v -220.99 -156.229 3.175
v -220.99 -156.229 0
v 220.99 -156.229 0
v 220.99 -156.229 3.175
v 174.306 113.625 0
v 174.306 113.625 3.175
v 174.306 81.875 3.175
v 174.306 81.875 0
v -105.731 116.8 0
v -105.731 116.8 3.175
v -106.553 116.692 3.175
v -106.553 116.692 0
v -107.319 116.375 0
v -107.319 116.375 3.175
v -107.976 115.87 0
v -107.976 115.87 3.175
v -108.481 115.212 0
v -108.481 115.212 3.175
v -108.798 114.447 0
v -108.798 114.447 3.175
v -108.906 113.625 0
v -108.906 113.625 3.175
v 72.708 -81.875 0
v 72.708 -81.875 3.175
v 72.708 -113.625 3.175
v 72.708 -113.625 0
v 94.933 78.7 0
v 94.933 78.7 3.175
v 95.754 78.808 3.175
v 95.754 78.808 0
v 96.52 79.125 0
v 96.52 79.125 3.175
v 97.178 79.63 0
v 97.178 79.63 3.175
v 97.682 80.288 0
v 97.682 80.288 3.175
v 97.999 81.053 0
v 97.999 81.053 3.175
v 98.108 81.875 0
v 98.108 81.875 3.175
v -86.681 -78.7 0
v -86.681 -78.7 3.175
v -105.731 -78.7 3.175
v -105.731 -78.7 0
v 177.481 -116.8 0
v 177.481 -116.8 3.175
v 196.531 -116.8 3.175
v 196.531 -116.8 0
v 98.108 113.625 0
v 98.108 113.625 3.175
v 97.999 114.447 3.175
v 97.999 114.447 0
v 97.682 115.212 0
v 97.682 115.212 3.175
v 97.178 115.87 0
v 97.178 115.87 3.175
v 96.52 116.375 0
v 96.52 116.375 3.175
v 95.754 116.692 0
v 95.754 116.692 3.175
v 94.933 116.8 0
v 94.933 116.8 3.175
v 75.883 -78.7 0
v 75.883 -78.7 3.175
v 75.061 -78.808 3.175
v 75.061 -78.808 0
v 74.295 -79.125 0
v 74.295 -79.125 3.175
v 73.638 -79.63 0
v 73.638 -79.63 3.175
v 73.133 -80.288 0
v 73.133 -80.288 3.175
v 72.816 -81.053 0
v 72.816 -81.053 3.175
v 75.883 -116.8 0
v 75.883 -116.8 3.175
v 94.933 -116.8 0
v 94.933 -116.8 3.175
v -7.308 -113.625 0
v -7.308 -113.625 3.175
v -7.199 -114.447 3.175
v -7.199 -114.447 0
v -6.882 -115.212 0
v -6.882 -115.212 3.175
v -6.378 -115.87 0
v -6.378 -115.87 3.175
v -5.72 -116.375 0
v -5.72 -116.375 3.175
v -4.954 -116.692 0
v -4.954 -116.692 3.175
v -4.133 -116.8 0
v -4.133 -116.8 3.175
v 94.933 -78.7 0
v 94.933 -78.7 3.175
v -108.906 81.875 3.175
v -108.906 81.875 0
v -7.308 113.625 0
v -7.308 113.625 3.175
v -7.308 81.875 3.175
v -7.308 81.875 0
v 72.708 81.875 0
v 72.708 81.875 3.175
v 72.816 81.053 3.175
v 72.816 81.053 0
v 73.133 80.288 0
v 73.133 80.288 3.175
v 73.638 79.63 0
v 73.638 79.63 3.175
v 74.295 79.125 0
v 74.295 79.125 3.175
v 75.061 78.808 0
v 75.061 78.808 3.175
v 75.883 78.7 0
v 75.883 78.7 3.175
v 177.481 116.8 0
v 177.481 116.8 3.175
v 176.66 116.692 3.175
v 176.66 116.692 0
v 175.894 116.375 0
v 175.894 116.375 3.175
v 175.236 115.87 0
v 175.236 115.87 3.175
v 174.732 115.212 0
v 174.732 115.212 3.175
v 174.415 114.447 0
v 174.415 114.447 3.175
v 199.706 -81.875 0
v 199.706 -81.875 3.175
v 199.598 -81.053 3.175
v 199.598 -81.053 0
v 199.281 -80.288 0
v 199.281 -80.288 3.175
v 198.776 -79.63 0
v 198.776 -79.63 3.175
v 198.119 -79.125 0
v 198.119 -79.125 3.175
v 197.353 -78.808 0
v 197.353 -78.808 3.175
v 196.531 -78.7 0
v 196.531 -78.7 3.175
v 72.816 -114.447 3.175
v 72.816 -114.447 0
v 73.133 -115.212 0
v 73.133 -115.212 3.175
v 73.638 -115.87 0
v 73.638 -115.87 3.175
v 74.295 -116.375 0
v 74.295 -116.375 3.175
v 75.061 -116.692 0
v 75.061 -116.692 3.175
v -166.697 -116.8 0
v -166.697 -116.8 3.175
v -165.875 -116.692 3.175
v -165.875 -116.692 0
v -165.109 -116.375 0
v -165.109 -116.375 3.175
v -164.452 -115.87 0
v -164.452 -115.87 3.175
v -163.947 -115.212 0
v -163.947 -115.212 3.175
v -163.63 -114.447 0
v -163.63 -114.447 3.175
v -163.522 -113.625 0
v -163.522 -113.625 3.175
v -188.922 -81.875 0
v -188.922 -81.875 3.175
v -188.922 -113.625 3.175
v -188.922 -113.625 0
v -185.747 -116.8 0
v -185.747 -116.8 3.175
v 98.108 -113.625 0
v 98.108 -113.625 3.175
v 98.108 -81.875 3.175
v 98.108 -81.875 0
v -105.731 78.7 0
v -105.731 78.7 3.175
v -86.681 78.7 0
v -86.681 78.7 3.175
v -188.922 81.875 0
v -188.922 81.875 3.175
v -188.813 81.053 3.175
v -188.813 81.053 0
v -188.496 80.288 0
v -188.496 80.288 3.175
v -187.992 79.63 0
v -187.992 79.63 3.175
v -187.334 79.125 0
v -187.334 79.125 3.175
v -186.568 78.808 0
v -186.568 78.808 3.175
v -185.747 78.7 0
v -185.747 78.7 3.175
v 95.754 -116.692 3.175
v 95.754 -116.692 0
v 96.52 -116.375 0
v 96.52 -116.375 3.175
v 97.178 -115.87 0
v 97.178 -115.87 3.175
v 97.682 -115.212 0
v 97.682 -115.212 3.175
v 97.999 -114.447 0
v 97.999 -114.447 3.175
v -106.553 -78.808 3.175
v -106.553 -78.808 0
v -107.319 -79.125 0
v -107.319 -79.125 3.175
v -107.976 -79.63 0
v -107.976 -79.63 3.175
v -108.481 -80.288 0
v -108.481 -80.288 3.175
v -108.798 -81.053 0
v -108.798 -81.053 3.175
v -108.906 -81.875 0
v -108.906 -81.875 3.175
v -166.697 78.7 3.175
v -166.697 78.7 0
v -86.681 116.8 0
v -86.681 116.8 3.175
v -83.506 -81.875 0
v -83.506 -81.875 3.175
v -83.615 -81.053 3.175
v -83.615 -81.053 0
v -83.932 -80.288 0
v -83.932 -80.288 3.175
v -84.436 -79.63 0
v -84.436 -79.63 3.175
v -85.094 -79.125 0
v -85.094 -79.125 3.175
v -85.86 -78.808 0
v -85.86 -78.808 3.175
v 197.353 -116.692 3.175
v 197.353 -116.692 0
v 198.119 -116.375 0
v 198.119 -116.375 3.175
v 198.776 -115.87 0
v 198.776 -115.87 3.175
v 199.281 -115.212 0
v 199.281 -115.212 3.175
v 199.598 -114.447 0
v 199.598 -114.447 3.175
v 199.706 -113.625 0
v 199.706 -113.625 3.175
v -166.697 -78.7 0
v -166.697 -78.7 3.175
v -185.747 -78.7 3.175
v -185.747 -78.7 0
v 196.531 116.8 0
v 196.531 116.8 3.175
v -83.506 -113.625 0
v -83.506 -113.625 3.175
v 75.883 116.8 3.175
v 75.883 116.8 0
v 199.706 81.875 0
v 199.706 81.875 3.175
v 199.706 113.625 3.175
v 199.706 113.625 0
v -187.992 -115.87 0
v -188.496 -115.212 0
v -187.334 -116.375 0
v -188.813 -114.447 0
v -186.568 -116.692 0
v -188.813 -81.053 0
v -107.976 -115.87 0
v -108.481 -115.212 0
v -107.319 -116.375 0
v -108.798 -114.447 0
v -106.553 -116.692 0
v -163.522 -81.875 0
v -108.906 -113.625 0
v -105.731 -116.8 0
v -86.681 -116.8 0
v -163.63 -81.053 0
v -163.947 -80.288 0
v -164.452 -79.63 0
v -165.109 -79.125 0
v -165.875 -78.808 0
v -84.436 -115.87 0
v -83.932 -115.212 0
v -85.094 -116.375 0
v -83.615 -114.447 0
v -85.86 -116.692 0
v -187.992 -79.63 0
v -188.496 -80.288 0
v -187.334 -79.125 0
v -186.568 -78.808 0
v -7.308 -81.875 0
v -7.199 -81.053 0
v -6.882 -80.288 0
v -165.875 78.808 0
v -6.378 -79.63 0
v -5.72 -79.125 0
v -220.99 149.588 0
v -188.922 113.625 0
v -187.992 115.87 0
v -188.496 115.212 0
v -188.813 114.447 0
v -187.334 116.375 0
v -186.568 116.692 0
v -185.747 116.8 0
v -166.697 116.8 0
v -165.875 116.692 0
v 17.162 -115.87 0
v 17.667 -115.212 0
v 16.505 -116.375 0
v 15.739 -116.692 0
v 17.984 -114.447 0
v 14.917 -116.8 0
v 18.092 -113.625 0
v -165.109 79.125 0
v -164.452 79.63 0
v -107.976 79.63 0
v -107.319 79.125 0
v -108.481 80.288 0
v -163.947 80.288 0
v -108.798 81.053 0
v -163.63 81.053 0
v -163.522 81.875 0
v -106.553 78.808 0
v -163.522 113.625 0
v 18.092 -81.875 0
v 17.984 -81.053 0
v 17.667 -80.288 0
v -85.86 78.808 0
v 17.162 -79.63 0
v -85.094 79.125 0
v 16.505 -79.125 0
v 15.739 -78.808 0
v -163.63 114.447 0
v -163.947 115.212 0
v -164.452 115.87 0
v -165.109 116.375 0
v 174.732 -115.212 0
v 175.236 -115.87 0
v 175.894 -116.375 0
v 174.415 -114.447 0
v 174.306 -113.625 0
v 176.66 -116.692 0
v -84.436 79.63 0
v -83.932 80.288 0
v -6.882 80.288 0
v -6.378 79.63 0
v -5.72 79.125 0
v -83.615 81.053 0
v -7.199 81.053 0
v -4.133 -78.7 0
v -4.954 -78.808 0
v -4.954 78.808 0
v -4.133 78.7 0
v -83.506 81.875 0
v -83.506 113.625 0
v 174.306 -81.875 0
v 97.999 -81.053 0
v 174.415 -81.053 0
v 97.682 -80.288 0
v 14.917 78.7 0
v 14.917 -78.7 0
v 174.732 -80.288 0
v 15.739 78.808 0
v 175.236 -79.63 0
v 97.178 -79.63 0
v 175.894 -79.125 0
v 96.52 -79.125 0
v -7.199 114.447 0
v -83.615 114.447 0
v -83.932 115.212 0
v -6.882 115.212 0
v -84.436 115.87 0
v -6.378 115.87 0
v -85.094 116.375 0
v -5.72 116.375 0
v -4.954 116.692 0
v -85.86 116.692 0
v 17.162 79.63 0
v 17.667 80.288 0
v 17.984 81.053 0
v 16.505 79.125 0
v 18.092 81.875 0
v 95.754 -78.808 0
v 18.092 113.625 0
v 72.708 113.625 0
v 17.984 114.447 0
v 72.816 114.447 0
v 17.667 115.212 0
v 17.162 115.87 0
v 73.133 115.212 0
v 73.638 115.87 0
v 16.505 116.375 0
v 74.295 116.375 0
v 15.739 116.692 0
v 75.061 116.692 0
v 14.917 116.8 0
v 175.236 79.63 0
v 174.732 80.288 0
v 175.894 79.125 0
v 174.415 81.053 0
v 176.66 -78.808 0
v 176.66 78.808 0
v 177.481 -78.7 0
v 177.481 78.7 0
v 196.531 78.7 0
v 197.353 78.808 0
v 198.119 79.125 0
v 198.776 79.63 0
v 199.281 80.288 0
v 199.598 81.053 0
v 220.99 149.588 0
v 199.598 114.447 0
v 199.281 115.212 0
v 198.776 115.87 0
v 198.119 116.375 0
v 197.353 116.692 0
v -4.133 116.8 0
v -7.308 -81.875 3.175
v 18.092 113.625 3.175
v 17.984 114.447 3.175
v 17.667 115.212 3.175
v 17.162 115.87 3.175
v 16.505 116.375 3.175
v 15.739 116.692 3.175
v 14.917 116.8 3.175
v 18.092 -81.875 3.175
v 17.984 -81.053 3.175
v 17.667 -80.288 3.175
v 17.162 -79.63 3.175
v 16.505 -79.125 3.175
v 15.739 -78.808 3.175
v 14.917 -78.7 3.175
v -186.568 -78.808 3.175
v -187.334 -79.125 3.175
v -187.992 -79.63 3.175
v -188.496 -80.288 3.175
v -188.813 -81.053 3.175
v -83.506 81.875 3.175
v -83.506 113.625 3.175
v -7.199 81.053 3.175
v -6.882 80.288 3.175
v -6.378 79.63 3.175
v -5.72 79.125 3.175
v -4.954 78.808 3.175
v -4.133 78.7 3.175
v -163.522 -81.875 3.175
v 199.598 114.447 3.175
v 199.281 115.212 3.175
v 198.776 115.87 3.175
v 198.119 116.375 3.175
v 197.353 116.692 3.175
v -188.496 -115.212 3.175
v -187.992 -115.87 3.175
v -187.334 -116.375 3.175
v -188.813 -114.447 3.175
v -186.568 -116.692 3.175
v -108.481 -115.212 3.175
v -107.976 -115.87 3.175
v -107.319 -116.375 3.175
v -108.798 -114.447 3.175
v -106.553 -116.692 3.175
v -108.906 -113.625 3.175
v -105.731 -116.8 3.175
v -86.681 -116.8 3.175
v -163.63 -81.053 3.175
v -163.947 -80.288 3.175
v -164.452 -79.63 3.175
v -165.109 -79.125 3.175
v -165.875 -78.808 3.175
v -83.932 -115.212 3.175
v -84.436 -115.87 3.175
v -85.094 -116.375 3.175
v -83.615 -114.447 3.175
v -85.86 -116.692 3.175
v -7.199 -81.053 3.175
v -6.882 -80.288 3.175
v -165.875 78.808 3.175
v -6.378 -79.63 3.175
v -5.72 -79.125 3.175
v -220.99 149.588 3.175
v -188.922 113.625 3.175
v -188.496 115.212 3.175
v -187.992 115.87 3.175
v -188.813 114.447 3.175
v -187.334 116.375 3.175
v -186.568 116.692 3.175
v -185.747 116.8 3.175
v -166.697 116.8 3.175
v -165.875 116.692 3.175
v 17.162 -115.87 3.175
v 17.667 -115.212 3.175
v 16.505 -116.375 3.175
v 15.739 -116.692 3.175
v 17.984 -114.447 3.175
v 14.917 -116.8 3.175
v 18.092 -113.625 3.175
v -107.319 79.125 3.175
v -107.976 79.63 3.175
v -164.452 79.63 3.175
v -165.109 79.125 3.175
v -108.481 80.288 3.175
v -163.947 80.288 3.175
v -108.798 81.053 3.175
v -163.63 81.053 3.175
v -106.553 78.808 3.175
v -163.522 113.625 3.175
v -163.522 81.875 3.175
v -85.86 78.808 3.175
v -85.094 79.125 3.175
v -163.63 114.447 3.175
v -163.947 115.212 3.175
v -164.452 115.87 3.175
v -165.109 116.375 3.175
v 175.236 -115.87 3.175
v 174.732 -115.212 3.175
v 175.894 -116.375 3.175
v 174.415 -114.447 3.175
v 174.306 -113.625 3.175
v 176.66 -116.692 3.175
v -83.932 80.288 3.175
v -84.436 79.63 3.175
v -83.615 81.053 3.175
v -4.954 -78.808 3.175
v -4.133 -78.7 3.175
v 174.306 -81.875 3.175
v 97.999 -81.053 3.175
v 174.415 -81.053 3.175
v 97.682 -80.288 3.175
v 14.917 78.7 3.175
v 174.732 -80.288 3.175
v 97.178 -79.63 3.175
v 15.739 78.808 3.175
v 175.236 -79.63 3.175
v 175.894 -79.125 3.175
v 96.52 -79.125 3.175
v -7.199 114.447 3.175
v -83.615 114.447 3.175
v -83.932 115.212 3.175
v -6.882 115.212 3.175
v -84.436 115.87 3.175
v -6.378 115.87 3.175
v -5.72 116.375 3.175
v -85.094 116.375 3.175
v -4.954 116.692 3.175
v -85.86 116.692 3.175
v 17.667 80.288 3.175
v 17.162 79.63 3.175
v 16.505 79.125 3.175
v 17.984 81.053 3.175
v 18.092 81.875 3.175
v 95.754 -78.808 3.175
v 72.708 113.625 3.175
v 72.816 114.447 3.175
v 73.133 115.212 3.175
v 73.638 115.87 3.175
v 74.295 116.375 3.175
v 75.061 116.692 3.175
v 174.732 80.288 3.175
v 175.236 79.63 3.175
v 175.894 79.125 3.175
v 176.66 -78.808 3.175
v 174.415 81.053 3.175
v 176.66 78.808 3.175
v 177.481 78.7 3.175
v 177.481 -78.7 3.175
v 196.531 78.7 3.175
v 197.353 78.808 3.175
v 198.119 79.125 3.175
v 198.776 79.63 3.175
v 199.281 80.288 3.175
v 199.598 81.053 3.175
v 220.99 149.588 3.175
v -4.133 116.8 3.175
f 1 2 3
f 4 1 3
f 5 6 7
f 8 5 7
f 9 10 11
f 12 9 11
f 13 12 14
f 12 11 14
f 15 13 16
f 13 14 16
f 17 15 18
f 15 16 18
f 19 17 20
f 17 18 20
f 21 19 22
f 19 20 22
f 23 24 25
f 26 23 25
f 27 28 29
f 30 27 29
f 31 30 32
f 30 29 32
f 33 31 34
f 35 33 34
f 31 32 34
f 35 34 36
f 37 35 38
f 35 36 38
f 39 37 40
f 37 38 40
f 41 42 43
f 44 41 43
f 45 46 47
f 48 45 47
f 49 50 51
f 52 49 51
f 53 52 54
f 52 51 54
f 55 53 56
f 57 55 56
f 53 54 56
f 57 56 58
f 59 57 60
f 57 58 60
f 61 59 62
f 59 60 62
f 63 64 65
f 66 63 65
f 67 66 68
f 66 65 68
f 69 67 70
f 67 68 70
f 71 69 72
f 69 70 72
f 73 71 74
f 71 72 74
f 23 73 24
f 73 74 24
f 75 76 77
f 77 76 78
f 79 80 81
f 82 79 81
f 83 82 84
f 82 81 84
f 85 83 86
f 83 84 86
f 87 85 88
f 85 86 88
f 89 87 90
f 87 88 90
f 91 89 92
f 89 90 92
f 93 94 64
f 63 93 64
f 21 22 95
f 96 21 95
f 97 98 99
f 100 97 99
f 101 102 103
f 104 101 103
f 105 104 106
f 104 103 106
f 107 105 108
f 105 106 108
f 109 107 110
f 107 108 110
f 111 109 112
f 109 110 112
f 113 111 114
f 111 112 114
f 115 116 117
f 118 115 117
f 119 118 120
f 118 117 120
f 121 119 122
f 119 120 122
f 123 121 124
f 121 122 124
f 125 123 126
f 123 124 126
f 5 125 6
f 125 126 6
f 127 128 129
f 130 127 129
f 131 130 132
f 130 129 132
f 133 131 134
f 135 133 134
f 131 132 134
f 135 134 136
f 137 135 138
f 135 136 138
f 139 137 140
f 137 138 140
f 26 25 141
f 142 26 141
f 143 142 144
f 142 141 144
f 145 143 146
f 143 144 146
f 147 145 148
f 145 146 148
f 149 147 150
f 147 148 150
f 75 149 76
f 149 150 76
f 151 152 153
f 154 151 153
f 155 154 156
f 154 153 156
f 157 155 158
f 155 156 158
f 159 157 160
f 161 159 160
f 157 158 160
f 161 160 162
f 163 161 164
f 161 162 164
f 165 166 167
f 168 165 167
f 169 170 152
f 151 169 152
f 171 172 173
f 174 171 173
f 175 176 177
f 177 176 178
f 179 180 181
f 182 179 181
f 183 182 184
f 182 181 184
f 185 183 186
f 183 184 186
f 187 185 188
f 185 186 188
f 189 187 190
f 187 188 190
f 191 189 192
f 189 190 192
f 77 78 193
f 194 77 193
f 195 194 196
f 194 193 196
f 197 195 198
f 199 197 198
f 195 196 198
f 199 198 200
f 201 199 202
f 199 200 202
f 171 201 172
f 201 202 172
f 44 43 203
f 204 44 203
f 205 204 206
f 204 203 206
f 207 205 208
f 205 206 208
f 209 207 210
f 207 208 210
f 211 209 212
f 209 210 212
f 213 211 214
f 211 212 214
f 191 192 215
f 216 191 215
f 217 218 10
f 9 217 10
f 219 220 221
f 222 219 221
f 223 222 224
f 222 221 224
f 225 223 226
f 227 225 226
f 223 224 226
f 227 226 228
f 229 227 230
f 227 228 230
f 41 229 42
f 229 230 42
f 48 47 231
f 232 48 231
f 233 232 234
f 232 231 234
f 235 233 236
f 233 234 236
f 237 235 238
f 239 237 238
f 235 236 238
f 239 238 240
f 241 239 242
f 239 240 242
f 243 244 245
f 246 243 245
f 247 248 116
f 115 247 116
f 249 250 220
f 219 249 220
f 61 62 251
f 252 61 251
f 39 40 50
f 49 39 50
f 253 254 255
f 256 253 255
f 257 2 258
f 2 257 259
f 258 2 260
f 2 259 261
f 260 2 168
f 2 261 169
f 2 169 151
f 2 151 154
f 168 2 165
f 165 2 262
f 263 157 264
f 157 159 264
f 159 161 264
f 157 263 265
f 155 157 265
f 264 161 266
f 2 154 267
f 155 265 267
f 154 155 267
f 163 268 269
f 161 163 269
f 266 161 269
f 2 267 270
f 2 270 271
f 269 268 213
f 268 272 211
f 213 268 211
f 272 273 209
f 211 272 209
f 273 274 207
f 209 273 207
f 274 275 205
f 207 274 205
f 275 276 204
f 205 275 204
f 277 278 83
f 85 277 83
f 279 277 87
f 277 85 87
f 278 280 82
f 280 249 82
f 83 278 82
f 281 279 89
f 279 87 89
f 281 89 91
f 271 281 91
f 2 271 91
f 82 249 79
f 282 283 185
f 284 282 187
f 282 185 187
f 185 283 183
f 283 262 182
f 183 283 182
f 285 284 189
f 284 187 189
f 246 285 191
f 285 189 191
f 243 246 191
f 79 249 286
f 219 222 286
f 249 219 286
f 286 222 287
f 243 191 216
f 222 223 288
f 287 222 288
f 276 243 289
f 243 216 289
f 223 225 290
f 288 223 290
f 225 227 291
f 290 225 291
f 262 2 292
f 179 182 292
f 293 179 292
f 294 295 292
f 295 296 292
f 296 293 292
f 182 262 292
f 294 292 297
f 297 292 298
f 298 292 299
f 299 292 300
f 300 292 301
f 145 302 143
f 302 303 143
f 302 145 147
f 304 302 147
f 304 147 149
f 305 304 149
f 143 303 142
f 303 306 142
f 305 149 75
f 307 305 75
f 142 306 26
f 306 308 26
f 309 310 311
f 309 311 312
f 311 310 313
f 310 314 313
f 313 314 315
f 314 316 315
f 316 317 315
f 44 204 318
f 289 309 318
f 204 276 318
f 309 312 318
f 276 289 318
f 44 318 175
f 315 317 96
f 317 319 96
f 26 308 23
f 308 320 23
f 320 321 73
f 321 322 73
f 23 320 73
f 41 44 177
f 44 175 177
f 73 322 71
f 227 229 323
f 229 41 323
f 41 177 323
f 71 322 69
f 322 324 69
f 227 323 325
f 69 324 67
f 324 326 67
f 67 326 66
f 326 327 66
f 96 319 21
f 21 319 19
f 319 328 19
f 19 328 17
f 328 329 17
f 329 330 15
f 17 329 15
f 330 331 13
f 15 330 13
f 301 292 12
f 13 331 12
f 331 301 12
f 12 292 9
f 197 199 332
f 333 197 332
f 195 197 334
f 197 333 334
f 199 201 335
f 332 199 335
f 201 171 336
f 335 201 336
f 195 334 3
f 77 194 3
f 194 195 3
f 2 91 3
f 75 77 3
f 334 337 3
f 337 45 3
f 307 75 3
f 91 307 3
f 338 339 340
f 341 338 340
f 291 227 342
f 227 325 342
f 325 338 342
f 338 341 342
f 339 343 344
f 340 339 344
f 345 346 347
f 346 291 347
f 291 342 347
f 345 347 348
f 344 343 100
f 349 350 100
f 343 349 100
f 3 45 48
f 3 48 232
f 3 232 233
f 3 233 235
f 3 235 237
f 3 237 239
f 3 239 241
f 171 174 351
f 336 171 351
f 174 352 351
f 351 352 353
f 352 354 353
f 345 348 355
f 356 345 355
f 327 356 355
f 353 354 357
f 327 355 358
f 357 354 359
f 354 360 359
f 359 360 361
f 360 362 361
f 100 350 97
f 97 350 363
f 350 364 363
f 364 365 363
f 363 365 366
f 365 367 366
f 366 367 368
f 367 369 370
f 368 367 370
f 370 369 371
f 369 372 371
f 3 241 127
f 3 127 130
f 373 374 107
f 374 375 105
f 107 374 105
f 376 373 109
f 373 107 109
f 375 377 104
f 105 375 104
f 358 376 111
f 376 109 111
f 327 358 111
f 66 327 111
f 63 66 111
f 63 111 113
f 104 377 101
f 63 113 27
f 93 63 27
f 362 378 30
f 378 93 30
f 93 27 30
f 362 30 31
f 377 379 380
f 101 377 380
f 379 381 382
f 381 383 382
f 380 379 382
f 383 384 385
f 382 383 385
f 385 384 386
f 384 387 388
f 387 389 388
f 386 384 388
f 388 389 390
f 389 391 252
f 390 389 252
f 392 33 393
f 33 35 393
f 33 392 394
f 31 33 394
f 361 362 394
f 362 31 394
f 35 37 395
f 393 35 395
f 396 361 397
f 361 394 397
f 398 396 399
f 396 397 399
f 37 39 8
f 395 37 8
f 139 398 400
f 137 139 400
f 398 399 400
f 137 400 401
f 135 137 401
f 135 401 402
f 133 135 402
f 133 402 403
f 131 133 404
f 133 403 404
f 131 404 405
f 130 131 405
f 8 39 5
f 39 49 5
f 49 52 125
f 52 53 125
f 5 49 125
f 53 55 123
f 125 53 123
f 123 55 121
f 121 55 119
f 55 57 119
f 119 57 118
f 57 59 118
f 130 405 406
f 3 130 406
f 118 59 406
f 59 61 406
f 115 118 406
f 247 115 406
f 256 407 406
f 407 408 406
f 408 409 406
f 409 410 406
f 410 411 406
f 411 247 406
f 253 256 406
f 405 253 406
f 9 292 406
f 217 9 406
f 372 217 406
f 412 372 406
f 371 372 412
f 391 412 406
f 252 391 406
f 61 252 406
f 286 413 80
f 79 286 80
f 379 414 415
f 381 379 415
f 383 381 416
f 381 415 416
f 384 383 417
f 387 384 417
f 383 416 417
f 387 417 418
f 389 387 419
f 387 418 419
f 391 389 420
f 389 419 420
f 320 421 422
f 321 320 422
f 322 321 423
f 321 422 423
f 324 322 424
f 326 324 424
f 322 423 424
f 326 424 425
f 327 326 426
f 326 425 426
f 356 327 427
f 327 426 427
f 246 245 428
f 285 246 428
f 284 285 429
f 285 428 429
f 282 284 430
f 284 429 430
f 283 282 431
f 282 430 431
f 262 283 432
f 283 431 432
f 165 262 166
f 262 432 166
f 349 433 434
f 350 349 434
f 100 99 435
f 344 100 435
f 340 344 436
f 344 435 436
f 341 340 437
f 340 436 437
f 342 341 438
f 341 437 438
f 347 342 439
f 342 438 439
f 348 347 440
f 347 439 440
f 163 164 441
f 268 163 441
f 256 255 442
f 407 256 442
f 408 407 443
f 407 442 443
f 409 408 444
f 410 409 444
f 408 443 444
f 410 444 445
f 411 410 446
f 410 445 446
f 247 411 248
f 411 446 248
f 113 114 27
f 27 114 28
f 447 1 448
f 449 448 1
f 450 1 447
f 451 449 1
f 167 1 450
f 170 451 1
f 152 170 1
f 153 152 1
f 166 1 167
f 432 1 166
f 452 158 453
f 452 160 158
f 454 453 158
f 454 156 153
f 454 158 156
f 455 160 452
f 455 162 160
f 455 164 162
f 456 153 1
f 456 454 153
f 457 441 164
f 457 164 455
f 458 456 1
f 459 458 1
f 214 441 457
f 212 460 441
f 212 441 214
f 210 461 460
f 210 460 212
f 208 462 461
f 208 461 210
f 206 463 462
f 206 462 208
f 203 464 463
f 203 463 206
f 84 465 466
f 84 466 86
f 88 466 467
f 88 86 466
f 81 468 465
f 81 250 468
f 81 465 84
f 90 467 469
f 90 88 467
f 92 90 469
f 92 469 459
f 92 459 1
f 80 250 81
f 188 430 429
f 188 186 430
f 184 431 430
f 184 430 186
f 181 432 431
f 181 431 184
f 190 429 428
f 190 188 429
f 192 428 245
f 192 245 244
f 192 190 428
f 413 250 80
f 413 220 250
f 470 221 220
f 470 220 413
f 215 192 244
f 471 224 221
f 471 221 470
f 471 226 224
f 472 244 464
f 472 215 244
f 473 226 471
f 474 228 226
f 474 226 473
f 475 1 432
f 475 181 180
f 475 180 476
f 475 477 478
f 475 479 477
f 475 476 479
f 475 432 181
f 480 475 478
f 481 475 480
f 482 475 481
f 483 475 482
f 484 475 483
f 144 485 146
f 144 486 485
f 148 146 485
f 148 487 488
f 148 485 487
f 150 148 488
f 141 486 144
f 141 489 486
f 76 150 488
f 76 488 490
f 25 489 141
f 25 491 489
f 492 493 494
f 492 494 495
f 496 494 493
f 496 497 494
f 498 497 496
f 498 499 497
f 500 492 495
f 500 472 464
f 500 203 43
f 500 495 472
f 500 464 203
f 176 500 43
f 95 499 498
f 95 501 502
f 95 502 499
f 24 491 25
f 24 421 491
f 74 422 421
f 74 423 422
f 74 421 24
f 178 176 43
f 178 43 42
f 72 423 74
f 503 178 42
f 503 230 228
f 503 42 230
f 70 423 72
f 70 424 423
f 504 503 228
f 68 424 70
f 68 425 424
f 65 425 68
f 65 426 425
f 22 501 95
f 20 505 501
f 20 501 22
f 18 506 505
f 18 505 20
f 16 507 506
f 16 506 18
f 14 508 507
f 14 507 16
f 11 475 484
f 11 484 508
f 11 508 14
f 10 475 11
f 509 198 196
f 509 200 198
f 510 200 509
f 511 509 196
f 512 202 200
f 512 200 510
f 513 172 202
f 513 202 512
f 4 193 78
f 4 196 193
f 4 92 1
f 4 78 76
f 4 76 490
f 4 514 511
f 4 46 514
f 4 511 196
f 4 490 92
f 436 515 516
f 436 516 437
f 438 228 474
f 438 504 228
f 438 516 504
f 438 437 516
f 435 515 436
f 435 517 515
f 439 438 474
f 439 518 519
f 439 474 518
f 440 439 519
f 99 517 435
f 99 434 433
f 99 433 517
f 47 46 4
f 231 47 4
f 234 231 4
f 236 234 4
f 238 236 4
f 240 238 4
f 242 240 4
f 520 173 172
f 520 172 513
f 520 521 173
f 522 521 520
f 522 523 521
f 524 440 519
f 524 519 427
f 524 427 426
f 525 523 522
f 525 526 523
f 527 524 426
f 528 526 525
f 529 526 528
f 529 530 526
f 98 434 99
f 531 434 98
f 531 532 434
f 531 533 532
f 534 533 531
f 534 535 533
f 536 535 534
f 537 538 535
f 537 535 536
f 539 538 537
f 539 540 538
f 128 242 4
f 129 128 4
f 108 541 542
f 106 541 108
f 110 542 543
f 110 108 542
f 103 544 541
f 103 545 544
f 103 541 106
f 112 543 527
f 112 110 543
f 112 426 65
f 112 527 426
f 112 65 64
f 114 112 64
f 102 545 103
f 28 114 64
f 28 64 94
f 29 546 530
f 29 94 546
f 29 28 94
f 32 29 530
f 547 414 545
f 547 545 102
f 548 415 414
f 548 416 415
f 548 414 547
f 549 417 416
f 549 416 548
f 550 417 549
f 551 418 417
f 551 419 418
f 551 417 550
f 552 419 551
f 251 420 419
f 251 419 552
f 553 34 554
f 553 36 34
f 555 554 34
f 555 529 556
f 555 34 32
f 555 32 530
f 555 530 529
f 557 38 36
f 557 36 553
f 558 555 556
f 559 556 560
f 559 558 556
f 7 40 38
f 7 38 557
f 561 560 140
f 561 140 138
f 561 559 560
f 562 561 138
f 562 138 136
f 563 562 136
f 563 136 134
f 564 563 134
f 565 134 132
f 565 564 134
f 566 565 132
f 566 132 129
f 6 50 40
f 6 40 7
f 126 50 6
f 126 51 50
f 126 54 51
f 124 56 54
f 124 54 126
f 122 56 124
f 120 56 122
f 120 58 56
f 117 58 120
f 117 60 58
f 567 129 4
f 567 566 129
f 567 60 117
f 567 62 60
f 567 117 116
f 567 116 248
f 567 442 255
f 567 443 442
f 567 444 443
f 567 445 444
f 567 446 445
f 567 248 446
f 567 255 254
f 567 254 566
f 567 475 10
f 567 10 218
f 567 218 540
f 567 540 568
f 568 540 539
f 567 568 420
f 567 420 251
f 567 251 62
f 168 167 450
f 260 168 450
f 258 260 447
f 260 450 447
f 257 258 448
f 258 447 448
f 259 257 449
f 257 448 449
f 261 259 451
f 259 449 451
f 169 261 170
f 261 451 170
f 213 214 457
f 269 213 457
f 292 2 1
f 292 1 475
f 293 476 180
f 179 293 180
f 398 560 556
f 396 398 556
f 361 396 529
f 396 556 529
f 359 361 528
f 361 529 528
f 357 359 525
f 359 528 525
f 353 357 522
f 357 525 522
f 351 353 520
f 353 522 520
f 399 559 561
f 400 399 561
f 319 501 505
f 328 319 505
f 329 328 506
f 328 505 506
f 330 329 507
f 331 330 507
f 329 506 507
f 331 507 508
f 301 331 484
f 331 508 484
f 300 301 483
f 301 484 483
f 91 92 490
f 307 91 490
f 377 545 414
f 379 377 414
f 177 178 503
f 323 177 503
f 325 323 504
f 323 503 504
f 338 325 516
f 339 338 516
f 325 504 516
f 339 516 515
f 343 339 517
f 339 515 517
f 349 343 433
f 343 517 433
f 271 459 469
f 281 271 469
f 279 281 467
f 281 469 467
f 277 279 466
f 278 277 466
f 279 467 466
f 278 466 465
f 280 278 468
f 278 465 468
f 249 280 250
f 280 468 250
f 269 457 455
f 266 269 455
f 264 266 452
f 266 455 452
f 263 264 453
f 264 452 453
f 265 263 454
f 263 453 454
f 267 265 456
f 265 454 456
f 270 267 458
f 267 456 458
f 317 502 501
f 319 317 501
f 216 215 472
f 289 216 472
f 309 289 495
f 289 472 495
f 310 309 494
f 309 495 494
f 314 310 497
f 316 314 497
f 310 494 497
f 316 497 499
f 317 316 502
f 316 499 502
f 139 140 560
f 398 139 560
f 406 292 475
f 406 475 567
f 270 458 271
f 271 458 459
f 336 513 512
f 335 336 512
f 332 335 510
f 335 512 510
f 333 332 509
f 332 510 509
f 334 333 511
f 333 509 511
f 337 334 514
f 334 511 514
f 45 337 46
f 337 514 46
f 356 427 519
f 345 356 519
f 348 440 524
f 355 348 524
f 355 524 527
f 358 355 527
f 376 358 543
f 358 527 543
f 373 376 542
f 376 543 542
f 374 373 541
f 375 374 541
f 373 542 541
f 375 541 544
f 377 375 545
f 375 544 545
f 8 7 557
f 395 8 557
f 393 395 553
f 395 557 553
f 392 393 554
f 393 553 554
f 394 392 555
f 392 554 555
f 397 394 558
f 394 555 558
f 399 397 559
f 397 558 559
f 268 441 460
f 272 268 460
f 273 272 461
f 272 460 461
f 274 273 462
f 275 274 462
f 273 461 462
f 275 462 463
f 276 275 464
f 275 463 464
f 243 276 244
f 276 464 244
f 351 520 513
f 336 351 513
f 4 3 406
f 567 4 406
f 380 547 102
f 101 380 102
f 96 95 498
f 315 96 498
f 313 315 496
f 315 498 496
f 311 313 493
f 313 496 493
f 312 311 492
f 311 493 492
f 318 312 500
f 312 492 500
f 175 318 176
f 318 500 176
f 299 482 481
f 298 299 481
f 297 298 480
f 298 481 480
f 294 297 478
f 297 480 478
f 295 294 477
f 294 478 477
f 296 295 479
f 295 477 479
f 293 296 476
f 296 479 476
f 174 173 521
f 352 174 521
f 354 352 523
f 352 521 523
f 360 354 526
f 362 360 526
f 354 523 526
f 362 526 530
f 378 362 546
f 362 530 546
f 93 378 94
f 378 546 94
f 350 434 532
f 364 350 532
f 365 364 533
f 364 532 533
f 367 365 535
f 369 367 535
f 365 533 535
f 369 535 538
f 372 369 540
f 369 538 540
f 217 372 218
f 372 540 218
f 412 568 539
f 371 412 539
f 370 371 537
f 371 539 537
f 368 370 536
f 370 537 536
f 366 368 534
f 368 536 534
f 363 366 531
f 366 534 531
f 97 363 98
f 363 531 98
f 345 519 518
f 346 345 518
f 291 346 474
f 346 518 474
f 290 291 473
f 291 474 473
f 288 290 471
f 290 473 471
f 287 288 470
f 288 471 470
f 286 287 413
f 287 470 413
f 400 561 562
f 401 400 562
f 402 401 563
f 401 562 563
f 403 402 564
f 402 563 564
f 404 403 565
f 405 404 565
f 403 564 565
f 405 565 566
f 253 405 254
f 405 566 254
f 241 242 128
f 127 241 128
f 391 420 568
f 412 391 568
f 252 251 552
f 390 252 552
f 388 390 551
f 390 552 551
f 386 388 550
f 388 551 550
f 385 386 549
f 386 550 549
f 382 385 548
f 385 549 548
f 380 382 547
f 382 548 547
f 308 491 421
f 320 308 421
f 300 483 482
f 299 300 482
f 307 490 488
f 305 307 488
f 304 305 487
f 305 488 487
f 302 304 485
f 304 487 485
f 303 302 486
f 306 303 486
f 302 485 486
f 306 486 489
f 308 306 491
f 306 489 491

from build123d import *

# Parameters (mm, degrees)
SKETCH1_W           = 441.979400076
SKETCH1_H           = 305.81676
BOSS_EXTRUDE1_DEPTH = 3.175
CUT_EXTRUDE1_DEPTH  = 271.654843319
CUT_EXTRUDE2_DEPTH  = 271.654843319
LPATTERN1_COUNT     = 3
LPATTERN1_PITCH     = 181.613999992
LPATTERN2_COUNT     = 2
LPATTERN2_PITCH     = 181.613999992


with BuildPart() as part:
    # Sketch1 → Boss-Extrude1 (new body)
    with BuildSketch(Plane.XY):
        with Locations((0, -3.32067)):
            Rectangle(SKETCH1_W, SKETCH1_H)
    extrude(amount=BOSS_EXTRUDE1_DEPTH)

    # Sketch2 → Cut-Extrude1 (cut, through all)
    with BuildSketch(Plane.XY.offset(3.175)):
        with BuildLine():
            Line((-185.746625, -116.8), (-166.696625, -116.8))
            ThreePointArc((-166.696625, -116.8), (-164.45156097, -115.87006403), (-163.521625, -113.625))
            Line((-163.521625, -113.625), (-163.521625, -81.875))
            ThreePointArc((-163.521625, -81.875), (-164.45156097, -79.62993597), (-166.696625, -78.7))
            Line((-166.696625, -78.7), (-185.746625, -78.7))
            ThreePointArc((-185.746625, -78.7), (-187.99168903, -79.62993597), (-188.921625, -81.875))
            Line((-188.921625, -81.875), (-188.921625, -113.625))
            ThreePointArc((-188.921625, -113.625), (-187.99168903, -115.87006403), (-185.746625, -116.8))
        make_face()
        with BuildLine():
            Line((-185.746625, 78.7), (-166.696625, 78.7))
            ThreePointArc((-166.696625, 78.7), (-164.45156097, 79.62993597), (-163.521625, 81.875))
            Line((-163.521625, 81.875), (-163.521625, 113.625))
            ThreePointArc((-163.521625, 113.625), (-164.45156097, 115.87006403), (-166.696625, 116.8))
            Line((-166.696625, 116.8), (-185.746625, 116.8))
            ThreePointArc((-185.746625, 116.8), (-187.99168903, 115.87006403), (-188.921625, 113.625))
            Line((-188.921625, 113.625), (-188.921625, 81.875))
            ThreePointArc((-188.921625, 81.875), (-187.99168903, 79.62993597), (-185.746625, 78.7))
        make_face()
    cut_extrude1 = extrude(amount=-CUT_EXTRUDE1_DEPTH, mode=Mode.SUBTRACT)

    # Sketch3 → Cut-Extrude2 (cut, through all)
    with BuildSketch(Plane.XY.offset(3.175)):
        with BuildLine():
            Line((-108.906375, -81.875), (-108.906375, -113.625))
            ThreePointArc((-108.906375, -113.625), (-107.97643903, -115.87006403), (-105.731375, -116.8))
            Line((-105.731375, -116.8), (-86.681375, -116.8))
            ThreePointArc((-86.681375, -116.8), (-84.43631097, -115.87006403), (-83.506375, -113.625))
            Line((-83.506375, -113.625), (-83.506375, -81.875))
            ThreePointArc((-83.506375, -81.875), (-84.43631097, -79.62993597), (-86.681375, -78.7))
            Line((-86.681375, -78.7), (-105.731375, -78.7))
            ThreePointArc((-105.731375, -78.7), (-107.97643903, -79.62993597), (-108.906375, -81.875))
        make_face()
        with BuildLine():
            Line((-83.506375, 81.875), (-83.506375, 113.625))
            ThreePointArc((-83.506375, 113.625), (-84.43631097, 115.87006403), (-86.681375, 116.8))
            Line((-86.681375, 116.8), (-105.731375, 116.8))
            ThreePointArc((-105.731375, 116.8), (-107.97643903, 115.87006403), (-108.906375, 113.625))
            Line((-108.906375, 113.625), (-108.906375, 81.875))
            ThreePointArc((-108.906375, 81.875), (-107.97643903, 79.62993597), (-105.731375, 78.7))
            Line((-105.731375, 78.7), (-86.681375, 78.7))
            ThreePointArc((-86.681375, 78.7), (-84.43631097, 79.62993597), (-83.506375, 81.875))
        make_face()
    cut_extrude2 = extrude(amount=-CUT_EXTRUDE2_DEPTH, mode=Mode.SUBTRACT)

    # LPattern1: Cut-Extrude1 ×3
    with Locations(*[(i * LPATTERN1_PITCH, 0, 0) for i in range(1, LPATTERN1_COUNT)]):
        add(cut_extrude1, mode=Mode.SUBTRACT)

    # LPattern2: Cut-Extrude2 ×2
    with Locations(*[(i * LPATTERN2_PITCH, 0, 0) for i in range(1, LPATTERN2_COUNT)]):
        add(cut_extrude2, mode=Mode.SUBTRACT)


solid = part.part
